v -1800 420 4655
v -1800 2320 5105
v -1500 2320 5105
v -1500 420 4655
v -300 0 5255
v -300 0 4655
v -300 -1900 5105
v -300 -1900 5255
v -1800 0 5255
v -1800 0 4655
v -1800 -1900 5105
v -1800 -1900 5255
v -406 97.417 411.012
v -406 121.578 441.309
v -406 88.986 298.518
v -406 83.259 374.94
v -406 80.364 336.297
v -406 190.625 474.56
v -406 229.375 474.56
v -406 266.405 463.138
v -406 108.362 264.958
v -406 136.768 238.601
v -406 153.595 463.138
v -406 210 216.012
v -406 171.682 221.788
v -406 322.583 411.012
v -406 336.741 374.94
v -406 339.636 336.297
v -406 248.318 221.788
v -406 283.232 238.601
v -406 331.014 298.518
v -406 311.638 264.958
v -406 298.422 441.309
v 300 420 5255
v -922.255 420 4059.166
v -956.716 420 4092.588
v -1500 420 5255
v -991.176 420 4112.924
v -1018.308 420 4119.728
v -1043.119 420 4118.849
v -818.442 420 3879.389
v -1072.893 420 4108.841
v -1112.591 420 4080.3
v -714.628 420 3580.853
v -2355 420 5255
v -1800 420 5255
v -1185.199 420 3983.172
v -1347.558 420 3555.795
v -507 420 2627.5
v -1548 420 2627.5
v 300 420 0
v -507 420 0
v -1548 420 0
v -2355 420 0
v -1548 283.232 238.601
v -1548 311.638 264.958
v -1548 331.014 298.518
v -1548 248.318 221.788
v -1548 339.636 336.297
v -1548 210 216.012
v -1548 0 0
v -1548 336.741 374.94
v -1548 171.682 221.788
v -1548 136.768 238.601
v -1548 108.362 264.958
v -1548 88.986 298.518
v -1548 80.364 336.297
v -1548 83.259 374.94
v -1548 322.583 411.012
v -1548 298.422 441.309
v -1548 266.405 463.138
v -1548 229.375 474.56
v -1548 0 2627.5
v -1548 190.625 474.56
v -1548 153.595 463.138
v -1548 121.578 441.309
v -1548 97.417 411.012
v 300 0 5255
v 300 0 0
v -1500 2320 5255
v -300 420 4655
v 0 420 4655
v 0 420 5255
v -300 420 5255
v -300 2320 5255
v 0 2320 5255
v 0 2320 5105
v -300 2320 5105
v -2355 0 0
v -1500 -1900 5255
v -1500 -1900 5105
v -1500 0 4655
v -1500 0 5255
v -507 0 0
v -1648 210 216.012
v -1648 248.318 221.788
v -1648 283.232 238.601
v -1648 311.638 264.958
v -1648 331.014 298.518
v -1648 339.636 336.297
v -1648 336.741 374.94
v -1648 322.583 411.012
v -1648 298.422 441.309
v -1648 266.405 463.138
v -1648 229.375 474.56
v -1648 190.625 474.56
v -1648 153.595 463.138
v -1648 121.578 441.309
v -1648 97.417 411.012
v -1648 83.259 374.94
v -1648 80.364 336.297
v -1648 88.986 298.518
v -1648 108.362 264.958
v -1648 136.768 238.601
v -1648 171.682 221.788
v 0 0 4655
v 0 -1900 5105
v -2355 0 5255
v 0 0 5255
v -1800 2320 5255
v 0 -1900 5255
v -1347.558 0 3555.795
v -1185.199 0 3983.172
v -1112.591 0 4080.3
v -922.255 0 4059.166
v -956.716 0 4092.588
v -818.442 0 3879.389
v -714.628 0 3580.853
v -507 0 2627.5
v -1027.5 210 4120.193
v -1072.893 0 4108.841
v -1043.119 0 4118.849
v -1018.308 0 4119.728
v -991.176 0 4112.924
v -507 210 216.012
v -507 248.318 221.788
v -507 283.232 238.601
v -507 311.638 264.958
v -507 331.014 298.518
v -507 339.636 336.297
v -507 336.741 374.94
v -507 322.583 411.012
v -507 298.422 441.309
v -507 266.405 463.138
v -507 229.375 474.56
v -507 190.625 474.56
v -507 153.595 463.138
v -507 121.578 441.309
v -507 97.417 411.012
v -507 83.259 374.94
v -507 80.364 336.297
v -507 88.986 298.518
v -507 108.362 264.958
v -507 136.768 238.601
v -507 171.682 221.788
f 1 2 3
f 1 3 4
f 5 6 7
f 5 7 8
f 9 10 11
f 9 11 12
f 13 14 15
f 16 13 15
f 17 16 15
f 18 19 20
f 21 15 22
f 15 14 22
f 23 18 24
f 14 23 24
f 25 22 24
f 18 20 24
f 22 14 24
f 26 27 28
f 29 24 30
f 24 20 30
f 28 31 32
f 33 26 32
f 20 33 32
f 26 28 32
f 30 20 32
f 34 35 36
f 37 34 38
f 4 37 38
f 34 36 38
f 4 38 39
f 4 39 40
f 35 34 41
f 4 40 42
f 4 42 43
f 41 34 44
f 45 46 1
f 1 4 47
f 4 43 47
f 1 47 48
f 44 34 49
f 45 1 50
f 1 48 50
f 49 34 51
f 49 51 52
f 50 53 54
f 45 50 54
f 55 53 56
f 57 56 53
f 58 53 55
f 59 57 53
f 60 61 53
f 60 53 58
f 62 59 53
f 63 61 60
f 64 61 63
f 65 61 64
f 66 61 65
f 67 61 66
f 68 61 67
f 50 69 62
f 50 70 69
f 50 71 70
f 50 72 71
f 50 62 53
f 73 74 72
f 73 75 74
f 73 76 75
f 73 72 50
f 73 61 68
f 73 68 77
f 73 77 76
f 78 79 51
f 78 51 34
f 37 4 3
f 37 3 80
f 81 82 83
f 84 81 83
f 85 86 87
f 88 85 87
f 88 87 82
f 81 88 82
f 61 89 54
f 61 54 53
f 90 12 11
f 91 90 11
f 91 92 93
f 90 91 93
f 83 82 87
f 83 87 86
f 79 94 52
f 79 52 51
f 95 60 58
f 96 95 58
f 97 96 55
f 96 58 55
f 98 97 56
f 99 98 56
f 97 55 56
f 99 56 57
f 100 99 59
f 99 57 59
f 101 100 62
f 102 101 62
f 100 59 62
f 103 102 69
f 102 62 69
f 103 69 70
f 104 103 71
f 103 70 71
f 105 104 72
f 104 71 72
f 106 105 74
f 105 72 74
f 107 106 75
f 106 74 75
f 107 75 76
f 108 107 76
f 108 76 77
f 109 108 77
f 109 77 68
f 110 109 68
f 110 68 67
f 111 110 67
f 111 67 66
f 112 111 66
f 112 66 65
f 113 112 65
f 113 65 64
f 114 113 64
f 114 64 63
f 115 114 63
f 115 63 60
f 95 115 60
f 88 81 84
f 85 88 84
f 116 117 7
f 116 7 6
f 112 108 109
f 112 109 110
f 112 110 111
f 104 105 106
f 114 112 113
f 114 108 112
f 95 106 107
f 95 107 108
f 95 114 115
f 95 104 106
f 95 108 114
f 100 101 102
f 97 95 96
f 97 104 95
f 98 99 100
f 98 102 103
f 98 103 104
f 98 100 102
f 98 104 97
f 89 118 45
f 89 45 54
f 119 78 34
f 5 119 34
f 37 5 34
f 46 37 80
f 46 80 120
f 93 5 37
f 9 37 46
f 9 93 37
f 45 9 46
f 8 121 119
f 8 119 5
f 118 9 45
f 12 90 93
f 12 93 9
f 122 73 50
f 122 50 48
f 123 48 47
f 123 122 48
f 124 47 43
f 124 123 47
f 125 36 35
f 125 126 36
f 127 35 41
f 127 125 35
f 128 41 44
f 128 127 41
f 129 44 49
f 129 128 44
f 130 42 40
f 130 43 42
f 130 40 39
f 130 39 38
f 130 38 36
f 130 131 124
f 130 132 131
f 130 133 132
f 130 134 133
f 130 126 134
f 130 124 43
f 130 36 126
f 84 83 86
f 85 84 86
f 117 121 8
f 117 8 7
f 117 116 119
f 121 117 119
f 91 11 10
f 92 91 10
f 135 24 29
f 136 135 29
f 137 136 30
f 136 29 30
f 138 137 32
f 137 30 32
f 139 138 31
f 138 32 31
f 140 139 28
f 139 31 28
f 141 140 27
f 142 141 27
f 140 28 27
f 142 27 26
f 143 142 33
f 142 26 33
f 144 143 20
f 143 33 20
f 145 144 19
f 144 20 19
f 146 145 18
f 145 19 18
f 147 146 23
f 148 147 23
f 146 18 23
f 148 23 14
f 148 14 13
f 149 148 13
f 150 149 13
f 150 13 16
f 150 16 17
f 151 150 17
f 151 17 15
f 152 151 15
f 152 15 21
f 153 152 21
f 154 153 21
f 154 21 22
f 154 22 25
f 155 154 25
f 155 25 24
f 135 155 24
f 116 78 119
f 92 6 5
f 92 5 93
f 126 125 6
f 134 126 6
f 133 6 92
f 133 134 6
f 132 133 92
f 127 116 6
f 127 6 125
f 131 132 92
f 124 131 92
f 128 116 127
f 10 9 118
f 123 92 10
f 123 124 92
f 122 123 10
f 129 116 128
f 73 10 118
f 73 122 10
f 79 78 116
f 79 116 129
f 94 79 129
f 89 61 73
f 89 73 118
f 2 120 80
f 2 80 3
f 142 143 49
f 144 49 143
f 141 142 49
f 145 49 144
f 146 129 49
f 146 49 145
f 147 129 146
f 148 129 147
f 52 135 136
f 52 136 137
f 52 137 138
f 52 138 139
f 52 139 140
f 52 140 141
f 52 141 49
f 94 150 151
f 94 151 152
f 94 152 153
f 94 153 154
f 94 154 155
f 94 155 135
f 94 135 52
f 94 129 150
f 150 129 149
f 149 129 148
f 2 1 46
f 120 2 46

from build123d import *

# Parameters (mm, degrees)
BOSS_EXTRUDE1_DEPTH = 420
BOSS_EXTRUDE2_DEPTH = 300
BOSS_EXTRUDE3_DEPTH = 300
CUT_EXTRUDE2_START  = -706
SKETCH4_R           = 130
CUT_EXTRUDE2_DEPTH  = 1242


with BuildPart() as part:
    # Sketch1 → Boss-Extrude1 (new body)
    with BuildSketch(Plane(origin=(0, 0, 0), x_dir=(1, 0, 0), z_dir=(0, 1, 0))):
        with BuildLine():
            Line((300, 0), (300, -5255))
            Line((300, -5255), (-2355, -5255))
            Line((-2355, -5255), (-2355, -4455))
            Line((-2355, -4455), (-2355, 0))
            Line((-2355, 0), (-1548, 0))
            Line((-1548, 0), (-1548, -2627.5))
            add(Edge.make_bspline(
                [(-1548, -2627.5), (-1027.5, -5612.886868633), (-507, -2627.5)],
                knots=[0, 0, 0, 1, 1, 1], degree=2))
            Line((-507, -2627.5), (-507, 0))
            Line((-507, 0), (300, 0))
        make_face()
    extrude(amount=BOSS_EXTRUDE1_DEPTH)

    # Sketch2 → Boss-Extrude2 (add)
    with BuildSketch(Plane(origin=(-1800, 0, 0), x_dir=(0, 0, -1), z_dir=(1, 0, 0))):
        Polygon((-5255, 420), (-5255, 2320), (-5105, 2320), (-4655, 420), align=None)
    boss_extrude2 = extrude(amount=BOSS_EXTRUDE2_DEPTH)


with BuildPart() as body_2:
    # Sketch3 → Boss-Extrude3 (new body)
    with BuildSketch(Plane(origin=(0, 0, 0), x_dir=(0, 0, -1), z_dir=(1, 0, 0))):
        Polygon((-5255, 420), (-5255, 2320), (-5105, 2320), (-4655, 420), align=None)
    boss_extrude3 = extrude(amount=-BOSS_EXTRUDE3_DEPTH)


with BuildPart() as part_1:
    add(part.part)

    # Mirror13: Boss-Extrude3 across plane
    add(boss_extrude3.mirror(Plane.ZX.offset(210)))

    # Mirror14: Boss-Extrude2 across plane
    add(boss_extrude2.mirror(Plane.ZX.offset(210)))

    # Sketch4 → Cut-Extrude2 (cut)
    with BuildSketch(Plane(origin=(300, 0, 0), x_dir=(0, 0, -1), z_dir=(1, 0, 0)).offset(CUT_EXTRUDE2_START)):
        with Locations((-346.012024202, 210)):
            Circle(SKETCH4_R)
    extrude(amount=-CUT_EXTRUDE2_DEPTH, mode=Mode.SUBTRACT)


solid = Compound([body_2.part, part_1.part])
